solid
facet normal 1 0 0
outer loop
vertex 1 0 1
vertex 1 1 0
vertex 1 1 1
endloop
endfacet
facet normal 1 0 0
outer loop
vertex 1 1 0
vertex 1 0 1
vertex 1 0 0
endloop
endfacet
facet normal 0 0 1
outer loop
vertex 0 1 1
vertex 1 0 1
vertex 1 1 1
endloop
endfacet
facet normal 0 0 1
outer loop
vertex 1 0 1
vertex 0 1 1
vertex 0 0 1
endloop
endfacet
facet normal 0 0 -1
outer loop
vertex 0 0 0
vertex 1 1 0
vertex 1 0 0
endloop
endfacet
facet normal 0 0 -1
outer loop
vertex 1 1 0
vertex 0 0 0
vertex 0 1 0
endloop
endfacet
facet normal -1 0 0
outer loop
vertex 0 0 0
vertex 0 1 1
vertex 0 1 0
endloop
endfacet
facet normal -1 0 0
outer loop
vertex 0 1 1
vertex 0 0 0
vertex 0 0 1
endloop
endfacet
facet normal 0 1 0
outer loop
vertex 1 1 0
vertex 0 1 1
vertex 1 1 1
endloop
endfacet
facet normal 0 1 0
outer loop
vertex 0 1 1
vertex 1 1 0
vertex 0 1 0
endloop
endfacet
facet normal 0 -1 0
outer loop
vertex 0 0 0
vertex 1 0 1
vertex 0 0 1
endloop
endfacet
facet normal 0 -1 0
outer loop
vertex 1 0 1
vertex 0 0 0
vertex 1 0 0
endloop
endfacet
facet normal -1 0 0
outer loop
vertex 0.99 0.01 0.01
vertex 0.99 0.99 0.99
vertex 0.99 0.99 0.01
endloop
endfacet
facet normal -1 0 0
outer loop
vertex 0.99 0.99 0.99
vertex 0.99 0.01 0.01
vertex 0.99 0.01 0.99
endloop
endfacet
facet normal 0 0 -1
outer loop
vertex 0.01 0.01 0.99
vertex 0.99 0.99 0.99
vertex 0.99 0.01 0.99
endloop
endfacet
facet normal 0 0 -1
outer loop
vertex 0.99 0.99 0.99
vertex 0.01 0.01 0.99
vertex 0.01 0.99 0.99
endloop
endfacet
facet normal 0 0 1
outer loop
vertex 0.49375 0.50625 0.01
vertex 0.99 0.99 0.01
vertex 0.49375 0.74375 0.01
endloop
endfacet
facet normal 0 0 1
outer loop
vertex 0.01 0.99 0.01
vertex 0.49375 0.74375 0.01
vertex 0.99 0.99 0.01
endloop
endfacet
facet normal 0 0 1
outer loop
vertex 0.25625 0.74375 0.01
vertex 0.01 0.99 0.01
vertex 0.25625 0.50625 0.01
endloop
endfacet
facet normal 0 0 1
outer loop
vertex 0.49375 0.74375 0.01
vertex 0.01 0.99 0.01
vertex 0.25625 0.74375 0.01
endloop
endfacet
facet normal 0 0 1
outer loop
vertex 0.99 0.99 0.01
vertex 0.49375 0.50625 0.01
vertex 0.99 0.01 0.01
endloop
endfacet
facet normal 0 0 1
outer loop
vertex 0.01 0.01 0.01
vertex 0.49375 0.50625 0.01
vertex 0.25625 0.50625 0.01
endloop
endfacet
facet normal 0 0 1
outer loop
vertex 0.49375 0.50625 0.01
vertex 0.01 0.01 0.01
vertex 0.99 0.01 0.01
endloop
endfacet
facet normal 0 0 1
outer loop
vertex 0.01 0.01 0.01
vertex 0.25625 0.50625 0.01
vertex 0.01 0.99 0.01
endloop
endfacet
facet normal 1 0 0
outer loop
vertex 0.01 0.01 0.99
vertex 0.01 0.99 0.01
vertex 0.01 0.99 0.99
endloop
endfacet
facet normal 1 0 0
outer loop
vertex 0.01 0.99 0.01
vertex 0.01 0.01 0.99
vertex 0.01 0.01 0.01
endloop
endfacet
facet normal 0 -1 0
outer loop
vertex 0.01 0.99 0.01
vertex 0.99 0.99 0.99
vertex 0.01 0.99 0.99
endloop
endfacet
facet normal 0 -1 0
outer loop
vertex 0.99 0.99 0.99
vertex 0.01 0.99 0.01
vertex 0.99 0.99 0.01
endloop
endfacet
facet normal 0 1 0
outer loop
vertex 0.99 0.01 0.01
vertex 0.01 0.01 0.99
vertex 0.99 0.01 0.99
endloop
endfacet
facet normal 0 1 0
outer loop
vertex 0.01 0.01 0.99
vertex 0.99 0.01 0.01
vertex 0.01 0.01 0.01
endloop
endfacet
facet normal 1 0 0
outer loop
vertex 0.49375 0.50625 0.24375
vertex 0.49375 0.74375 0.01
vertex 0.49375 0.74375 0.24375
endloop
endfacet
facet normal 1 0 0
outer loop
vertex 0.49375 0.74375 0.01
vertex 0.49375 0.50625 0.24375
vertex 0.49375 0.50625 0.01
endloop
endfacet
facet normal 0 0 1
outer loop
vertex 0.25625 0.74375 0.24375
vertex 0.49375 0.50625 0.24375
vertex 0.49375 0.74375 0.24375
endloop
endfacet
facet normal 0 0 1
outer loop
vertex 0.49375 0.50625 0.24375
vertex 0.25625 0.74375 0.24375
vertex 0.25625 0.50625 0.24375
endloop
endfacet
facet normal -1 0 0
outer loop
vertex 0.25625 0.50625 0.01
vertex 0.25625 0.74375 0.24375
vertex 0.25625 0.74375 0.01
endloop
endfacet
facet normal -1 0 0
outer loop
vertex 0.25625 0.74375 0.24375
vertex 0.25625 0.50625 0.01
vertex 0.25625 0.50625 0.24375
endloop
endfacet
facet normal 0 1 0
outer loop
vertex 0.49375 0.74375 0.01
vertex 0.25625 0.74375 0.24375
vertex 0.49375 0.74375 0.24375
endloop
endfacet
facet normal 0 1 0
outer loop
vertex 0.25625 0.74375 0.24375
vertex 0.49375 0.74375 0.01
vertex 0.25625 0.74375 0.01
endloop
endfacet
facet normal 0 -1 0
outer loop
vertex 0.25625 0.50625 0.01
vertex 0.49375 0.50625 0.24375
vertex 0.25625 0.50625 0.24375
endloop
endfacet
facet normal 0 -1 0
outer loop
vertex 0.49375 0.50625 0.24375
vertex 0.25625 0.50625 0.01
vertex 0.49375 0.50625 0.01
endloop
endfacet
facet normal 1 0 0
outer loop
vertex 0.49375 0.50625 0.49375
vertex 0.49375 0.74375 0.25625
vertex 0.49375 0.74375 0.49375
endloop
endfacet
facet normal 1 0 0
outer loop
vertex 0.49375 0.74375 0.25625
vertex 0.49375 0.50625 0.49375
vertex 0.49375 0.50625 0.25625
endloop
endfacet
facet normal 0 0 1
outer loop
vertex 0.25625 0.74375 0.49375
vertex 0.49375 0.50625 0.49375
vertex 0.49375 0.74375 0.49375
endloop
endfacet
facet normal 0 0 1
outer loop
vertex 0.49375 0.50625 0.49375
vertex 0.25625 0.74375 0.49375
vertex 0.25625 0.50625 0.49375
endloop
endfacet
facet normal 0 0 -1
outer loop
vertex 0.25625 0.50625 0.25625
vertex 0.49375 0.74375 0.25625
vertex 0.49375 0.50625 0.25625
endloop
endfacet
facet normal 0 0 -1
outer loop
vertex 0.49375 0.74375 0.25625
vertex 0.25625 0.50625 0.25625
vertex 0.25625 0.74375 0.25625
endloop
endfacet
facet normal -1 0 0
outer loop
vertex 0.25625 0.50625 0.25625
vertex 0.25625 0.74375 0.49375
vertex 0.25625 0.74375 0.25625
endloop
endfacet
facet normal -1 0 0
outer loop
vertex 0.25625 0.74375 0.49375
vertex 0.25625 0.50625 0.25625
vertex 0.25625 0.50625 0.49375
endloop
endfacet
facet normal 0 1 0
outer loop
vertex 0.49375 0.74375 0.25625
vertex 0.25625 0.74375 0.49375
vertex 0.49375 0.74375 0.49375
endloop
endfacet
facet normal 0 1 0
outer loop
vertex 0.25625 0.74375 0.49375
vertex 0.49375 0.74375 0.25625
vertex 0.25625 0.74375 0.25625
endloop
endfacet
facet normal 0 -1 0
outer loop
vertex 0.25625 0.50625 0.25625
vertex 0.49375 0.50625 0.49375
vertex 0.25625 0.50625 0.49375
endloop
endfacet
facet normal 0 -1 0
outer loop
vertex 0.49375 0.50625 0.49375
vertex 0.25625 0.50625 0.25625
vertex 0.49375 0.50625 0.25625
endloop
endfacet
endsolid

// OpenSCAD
translate([0.375, 0.625, 0.125]) color([0.2616500206534439, 0.292388978519858, 0.6822268022305197]) cube([0.2375, 0.2375, 0.2375], center=true);
translate([0.375, 0.625, 0.375]) color([0.6793183354409675, 0.052800824167059335, 0.13687799840204007]) cube([0.2375, 0.2375, 0.2375], center=true);
color([0.3,0.3,0.3,0.3]) difference() { cube([1,1,1]); translate([0.01,0.01,0.01]) cube([0.98,0.98,0.98]); }
